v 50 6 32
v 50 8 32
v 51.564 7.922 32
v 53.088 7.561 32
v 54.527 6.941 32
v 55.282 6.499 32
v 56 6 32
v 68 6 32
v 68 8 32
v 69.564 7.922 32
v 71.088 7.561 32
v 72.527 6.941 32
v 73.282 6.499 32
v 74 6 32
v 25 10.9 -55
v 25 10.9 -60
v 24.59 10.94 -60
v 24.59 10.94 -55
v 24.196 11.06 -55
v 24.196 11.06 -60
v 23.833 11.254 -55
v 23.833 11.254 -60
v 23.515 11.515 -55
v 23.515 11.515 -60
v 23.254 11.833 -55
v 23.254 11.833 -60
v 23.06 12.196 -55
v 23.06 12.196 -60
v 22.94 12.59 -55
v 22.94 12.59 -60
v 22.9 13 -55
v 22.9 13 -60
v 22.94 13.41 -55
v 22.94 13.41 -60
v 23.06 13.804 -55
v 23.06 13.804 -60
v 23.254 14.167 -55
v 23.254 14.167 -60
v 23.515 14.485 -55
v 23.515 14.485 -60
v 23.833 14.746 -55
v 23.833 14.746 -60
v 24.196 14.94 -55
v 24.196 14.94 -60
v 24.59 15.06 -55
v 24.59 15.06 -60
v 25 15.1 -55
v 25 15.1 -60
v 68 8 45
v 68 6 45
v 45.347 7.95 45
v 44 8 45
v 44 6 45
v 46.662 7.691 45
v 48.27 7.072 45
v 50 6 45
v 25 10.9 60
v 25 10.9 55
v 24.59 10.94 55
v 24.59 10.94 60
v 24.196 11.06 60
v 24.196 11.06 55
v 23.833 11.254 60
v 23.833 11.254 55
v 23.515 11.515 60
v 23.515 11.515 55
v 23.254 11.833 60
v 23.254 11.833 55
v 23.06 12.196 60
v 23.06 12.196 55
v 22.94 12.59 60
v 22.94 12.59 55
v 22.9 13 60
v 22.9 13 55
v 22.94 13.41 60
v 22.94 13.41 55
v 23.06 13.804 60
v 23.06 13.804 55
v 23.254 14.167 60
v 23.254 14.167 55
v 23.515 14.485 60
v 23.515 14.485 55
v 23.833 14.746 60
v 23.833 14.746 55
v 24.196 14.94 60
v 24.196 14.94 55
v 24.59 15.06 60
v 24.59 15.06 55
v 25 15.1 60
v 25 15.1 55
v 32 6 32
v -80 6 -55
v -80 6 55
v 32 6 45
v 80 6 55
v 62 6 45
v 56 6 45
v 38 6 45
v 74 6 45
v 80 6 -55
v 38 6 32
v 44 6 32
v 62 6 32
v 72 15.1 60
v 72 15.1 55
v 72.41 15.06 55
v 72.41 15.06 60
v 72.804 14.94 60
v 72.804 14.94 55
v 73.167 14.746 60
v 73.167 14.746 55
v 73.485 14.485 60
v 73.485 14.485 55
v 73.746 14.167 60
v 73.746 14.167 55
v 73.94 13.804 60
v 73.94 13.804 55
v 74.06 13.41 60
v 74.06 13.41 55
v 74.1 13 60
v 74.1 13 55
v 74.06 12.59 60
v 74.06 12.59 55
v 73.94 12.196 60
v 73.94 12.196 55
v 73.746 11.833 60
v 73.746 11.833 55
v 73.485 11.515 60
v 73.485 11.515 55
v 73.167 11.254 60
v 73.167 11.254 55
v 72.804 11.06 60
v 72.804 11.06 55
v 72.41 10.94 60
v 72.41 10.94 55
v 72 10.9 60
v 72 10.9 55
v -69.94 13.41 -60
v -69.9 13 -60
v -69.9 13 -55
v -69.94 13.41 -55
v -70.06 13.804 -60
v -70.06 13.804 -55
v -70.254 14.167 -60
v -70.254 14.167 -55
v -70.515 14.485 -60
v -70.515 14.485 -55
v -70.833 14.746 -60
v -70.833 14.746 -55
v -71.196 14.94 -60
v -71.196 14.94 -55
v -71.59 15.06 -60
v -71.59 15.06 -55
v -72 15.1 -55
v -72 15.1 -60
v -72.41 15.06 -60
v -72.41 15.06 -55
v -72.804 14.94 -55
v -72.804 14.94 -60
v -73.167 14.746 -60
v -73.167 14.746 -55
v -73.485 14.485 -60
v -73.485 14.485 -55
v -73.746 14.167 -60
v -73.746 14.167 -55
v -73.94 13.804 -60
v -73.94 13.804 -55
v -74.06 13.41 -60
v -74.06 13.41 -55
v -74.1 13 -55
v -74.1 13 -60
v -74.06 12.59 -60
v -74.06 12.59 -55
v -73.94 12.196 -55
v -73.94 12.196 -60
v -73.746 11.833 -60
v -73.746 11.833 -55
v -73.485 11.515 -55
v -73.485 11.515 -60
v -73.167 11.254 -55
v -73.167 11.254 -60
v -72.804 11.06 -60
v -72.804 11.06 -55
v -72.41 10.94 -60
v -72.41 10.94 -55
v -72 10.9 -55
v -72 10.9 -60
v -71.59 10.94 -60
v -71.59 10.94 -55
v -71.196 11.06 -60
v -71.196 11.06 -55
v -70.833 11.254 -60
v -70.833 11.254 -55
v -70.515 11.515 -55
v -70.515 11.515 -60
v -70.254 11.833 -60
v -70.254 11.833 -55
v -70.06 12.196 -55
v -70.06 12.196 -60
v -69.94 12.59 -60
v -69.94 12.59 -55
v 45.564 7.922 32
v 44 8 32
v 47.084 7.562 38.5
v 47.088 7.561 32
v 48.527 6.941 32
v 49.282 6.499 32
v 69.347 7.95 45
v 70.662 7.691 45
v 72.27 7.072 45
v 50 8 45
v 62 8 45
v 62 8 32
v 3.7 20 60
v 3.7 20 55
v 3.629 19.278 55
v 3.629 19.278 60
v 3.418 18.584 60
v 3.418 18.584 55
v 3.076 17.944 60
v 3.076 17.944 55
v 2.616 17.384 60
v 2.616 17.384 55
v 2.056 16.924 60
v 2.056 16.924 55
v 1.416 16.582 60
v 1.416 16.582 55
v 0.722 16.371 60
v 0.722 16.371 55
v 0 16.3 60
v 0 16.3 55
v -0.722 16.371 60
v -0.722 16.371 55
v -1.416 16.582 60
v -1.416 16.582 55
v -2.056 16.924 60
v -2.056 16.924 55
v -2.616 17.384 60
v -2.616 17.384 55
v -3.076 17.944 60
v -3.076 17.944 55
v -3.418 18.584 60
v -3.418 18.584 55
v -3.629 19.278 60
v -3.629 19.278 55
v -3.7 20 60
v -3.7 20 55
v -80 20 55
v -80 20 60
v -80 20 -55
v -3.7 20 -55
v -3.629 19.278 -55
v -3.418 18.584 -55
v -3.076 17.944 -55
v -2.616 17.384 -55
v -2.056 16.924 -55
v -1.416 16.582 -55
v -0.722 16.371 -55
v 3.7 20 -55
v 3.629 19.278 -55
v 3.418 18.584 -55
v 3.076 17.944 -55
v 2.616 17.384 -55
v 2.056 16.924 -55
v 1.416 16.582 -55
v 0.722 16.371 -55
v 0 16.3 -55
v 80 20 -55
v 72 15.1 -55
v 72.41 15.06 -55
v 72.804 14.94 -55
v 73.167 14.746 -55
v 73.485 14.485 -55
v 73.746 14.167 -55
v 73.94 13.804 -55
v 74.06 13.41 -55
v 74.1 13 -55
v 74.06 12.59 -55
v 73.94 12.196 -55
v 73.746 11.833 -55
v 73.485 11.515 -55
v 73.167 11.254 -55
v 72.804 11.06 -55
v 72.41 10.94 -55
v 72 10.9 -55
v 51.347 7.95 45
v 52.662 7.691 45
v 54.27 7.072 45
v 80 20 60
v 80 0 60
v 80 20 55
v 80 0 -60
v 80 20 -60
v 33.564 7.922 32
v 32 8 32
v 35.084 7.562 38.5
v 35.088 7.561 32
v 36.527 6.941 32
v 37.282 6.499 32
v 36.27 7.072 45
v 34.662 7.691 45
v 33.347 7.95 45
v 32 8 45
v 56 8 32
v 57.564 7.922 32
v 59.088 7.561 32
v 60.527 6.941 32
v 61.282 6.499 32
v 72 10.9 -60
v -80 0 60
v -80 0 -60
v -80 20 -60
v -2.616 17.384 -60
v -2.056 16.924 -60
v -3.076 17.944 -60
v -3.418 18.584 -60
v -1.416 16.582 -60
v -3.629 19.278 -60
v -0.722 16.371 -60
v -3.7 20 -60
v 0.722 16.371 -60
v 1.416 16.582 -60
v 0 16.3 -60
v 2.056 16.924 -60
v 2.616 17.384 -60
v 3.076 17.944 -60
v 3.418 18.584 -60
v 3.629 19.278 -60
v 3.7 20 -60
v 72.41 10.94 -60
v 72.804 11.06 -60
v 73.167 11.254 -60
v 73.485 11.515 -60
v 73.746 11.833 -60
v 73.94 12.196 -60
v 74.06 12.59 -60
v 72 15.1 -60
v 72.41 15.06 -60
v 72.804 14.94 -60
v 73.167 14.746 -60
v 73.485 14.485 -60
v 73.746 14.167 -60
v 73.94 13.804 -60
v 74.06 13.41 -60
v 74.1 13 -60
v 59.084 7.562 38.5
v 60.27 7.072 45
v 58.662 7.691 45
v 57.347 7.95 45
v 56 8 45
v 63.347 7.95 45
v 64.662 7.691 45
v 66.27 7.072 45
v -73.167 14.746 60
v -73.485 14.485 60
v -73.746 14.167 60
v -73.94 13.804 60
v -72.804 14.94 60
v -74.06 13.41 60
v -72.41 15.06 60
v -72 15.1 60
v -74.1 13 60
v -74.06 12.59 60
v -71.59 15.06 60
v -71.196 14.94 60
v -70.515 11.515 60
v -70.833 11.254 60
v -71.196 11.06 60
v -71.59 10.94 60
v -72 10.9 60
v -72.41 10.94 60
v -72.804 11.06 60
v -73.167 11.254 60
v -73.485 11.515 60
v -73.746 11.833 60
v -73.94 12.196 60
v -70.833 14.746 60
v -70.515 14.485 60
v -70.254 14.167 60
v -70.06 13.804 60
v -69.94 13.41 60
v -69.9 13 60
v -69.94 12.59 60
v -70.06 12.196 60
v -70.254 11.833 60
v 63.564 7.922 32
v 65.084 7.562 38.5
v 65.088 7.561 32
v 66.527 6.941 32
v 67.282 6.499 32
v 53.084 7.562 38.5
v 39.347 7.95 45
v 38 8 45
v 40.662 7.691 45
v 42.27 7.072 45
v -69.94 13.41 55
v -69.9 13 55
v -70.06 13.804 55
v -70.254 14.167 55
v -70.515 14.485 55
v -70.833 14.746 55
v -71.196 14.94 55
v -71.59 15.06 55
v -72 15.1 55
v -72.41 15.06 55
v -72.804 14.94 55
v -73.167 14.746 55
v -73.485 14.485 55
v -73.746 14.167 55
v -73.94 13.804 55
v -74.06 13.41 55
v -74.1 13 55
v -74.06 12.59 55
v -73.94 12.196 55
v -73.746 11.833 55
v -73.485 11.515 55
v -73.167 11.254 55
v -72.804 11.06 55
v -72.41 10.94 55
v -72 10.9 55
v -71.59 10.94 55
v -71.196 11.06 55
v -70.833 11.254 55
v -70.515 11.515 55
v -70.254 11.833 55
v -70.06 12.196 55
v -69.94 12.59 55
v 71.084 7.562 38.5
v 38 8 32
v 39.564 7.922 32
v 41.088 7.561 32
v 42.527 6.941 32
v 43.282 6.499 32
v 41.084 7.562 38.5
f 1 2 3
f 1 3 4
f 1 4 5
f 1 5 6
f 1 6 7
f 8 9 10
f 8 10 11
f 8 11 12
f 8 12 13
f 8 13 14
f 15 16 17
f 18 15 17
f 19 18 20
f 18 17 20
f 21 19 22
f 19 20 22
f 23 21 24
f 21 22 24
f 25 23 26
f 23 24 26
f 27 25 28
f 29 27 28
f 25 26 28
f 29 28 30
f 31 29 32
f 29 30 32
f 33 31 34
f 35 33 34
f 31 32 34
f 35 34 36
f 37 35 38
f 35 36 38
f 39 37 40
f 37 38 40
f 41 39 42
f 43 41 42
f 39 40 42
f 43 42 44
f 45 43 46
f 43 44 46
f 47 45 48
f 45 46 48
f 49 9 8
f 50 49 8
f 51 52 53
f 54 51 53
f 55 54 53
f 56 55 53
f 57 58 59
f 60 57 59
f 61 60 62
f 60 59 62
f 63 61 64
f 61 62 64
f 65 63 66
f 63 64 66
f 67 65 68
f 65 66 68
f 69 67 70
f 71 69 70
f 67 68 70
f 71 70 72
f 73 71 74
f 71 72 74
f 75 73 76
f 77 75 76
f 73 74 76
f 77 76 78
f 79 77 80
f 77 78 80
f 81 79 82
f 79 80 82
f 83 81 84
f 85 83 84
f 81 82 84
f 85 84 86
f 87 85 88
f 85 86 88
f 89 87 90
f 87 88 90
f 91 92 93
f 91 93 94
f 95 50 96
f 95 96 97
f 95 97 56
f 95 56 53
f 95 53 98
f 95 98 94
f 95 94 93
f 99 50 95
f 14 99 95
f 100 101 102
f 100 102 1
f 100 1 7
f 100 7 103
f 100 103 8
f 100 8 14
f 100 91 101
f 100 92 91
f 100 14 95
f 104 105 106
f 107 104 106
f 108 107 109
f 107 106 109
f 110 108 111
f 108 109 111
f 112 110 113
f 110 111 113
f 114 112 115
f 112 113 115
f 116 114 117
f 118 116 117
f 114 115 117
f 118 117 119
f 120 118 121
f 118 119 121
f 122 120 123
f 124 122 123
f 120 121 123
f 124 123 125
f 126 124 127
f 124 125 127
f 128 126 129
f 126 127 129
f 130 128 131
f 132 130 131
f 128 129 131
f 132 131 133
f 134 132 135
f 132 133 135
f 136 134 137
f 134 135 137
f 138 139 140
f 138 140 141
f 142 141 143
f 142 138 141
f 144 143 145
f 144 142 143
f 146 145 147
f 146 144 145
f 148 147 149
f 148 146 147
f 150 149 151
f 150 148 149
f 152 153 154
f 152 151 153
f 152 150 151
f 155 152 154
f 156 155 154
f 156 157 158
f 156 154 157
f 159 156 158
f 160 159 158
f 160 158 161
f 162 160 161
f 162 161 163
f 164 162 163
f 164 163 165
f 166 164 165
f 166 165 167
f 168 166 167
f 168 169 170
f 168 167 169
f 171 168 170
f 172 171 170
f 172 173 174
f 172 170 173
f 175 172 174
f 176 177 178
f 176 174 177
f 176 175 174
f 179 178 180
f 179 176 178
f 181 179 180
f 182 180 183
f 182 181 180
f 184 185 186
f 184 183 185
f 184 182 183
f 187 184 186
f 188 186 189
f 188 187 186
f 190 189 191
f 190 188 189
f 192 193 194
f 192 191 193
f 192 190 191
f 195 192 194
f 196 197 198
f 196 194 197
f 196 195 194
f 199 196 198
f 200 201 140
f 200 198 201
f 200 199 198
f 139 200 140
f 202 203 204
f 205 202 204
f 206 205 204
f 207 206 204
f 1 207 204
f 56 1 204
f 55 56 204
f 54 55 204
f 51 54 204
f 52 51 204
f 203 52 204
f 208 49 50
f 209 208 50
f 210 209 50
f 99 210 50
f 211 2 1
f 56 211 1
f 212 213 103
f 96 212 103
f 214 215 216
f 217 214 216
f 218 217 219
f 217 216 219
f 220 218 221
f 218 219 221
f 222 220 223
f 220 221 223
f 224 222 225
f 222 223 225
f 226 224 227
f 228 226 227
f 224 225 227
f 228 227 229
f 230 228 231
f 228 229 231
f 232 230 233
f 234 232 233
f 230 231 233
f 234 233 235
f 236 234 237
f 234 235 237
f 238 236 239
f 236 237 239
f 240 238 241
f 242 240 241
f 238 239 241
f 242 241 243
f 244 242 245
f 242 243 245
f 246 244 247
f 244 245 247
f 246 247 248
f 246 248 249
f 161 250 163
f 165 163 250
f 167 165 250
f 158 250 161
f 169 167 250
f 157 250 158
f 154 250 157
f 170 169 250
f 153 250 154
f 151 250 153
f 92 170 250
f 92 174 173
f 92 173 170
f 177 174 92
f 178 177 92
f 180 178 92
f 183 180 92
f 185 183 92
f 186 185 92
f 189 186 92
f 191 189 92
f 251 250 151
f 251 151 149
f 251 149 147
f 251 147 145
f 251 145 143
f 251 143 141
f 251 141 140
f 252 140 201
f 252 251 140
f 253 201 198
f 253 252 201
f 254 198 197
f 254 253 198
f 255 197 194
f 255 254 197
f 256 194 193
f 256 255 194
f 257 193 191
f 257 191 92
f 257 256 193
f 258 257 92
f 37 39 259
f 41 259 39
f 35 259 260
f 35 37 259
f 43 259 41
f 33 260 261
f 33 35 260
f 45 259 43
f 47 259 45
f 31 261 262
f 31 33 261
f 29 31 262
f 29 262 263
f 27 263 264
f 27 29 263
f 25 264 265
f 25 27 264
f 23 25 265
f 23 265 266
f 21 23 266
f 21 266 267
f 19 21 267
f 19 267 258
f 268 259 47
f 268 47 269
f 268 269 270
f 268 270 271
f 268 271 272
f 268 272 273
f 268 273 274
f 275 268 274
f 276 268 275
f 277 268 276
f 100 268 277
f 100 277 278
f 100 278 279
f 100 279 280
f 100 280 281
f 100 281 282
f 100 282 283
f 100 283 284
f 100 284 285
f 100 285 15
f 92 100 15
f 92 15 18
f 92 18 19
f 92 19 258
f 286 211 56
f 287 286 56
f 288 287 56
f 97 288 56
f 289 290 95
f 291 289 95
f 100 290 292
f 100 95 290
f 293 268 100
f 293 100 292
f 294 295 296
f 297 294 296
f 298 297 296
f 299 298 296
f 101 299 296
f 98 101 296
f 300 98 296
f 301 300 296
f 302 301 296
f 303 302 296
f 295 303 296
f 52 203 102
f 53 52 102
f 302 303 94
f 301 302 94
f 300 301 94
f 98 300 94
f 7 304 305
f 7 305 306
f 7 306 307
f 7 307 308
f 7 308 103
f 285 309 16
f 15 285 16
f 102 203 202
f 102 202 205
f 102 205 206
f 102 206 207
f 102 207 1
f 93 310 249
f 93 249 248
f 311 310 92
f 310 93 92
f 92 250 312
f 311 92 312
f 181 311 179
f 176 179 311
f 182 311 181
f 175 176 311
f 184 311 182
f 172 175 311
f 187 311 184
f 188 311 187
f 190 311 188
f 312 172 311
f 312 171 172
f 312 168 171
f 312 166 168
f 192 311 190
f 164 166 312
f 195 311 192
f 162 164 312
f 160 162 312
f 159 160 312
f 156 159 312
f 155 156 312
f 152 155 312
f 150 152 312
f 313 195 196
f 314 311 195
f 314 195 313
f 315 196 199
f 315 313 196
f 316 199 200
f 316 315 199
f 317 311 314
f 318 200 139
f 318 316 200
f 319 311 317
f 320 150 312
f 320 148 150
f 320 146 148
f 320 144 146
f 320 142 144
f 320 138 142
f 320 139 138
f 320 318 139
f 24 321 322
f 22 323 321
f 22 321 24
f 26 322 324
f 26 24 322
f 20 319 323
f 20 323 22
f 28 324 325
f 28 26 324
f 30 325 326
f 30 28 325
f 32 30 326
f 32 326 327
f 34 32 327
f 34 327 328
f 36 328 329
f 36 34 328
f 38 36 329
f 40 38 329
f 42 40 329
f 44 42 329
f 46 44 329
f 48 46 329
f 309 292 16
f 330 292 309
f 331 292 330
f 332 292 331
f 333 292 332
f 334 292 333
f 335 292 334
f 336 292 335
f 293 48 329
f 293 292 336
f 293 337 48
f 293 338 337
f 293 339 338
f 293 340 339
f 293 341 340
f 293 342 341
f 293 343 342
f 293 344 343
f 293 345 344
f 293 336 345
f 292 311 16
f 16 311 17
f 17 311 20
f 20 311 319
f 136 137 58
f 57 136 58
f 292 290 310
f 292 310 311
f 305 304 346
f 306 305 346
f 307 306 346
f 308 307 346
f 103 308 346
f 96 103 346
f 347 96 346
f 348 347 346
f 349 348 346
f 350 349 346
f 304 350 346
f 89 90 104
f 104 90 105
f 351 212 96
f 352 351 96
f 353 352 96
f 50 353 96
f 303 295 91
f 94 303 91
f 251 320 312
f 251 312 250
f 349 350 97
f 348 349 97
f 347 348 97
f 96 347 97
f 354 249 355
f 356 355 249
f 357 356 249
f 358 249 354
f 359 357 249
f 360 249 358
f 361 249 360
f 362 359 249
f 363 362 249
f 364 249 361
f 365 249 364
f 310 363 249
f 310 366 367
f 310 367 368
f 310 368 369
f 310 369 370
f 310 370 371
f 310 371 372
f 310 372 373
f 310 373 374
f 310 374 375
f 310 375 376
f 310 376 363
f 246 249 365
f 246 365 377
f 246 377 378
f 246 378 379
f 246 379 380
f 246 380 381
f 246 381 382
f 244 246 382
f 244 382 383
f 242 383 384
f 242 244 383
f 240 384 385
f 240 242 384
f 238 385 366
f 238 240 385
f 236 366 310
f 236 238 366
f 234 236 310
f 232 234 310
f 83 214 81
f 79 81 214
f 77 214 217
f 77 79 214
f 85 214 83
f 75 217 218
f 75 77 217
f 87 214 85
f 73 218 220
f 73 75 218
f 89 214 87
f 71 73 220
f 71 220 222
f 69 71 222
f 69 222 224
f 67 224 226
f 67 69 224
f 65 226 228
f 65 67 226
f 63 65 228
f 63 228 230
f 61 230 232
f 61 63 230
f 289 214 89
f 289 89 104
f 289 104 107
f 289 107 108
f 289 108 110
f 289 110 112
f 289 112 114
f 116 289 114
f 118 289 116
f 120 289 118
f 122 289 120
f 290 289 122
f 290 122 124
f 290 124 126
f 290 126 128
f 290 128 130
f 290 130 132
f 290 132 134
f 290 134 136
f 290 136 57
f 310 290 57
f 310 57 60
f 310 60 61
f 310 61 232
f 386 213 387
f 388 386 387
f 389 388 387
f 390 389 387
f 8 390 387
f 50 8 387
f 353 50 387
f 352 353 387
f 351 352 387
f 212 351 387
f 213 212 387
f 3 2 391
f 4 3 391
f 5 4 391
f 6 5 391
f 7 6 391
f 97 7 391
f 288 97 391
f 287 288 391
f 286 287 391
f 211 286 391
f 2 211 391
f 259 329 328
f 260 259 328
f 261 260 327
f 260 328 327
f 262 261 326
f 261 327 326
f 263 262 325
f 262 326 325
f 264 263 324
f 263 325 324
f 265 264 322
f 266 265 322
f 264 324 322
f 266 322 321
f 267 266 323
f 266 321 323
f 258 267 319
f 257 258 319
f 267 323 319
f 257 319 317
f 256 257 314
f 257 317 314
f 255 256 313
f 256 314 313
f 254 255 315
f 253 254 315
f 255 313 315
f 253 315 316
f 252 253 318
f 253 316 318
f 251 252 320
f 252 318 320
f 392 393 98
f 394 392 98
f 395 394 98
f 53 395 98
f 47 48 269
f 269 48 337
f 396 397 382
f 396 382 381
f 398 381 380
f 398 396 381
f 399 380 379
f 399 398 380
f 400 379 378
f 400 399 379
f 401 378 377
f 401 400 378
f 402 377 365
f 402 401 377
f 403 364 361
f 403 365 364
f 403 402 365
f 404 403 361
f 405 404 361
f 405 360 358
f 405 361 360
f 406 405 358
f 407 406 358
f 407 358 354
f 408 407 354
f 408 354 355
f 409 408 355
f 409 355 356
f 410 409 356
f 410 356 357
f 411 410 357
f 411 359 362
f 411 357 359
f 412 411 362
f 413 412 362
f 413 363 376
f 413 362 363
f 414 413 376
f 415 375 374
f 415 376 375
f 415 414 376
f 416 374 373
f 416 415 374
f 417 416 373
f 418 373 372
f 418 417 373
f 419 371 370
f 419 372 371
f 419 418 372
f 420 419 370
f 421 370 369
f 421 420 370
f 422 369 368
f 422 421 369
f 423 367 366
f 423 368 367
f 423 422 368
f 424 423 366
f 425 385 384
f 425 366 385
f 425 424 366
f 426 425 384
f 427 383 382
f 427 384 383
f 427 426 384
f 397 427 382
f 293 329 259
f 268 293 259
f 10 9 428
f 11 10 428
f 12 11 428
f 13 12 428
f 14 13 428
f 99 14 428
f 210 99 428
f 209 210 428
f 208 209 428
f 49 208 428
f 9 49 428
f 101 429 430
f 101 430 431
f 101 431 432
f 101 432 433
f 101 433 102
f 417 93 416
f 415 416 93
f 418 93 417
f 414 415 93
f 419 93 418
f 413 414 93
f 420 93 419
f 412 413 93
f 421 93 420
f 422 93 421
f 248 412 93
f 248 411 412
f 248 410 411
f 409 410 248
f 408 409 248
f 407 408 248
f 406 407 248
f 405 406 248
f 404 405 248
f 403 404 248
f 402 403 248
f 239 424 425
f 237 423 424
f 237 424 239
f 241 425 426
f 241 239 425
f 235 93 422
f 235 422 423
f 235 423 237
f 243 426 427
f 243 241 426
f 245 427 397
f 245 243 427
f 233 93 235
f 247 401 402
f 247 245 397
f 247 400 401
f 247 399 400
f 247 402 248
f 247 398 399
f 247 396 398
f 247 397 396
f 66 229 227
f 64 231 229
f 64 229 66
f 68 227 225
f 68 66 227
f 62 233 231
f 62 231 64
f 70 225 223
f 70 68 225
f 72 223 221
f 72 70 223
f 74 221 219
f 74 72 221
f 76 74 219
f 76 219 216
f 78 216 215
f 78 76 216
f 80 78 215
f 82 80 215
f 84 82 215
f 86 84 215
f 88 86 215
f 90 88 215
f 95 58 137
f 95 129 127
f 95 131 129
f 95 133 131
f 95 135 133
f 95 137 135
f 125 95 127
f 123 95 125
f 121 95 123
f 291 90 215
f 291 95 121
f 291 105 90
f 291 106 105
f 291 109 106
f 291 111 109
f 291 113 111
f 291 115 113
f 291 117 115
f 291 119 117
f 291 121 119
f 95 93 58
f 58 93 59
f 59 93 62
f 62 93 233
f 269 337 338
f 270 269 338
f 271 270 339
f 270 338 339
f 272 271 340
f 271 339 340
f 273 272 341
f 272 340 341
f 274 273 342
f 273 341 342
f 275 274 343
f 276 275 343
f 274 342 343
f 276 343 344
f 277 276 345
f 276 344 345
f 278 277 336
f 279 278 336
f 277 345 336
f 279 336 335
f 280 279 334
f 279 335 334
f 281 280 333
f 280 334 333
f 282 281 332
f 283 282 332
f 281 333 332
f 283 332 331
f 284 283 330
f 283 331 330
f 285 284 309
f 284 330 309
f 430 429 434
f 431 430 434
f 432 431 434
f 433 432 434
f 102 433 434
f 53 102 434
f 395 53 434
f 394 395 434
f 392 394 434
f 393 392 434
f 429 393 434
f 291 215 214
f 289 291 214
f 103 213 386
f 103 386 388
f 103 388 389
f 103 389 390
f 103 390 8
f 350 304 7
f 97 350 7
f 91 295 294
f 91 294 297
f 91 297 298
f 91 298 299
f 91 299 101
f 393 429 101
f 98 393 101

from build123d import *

# Parameters (mm, degrees)
AUFSATZ_LINEAR_AUSTRAGEN3_DEPTH      = 80
SCHNITT_LINEAR_AUSTRAGEN1_DEPTH      = 146.602197786
SCHNITT_LINEAR_AUSTRAGEN1_DEPTH_BACK = 146.602197786
SKIZZE10_R                           = 2.1
SCHNITT_LINEAR_AUSTRAGEN2_DEPTH      = 102.980390272
SCHNITT_LINEAR_AUSTRAGEN2_DEPTH_BACK = 102.980390272
AUFSATZ_LINEAR_AUSTRAGEN4_DEPTH      = 45
LINEARES_MUSTER1_COUNT               = 7
LINEARES_MUSTER1_PITCH               = 6
SKIZZE19_W                           = 160
SKIZZE19_H                           = 14
SCHNITT_LINEAR_AUSTRAGEN3_DEPTH      = 32


with BuildPart() as part:
    # Skizze9 → Aufsatz-Linear austragen3 (new, symmetric)
    with BuildSketch(Plane(origin=(0, 0, 0), x_dir=(0, 0, -1), z_dir=(1, 0, 0))):
        Polygon((-60, 20), (-60, 0), (60, 0), (60, 20), (55, 20), (55, 6), (-55, 6), (-55, 20), align=None)
    extrude(amount=AUFSATZ_LINEAR_AUSTRAGEN3_DEPTH, both=True)

    # Skizze10 → Schnitt-Linear austragen1 (cut, two sides: drawn at the far end of the back side and taken through both)
    with BuildSketch(Plane.XY.offset(60).offset(-SCHNITT_LINEAR_AUSTRAGEN1_DEPTH_BACK)):
        with Locations((-72, 13)):
            Circle(SKIZZE10_R)
        with BuildLine():
            Line((25, 15.1), (72, 15.1))
            ThreePointArc((72, 15.1), (74.1, 13), (72, 10.9))
            Line((72, 10.9), (25, 10.9))
            ThreePointArc((25, 10.9), (22.9, 13), (25, 15.1))
        make_face()
    extrude(amount=SCHNITT_LINEAR_AUSTRAGEN1_DEPTH + SCHNITT_LINEAR_AUSTRAGEN1_DEPTH_BACK, mode=Mode.SUBTRACT)

    # Skizze12 → Schnitt-Linear austragen2 (cut, two sides: drawn at the far end of the back side and taken through both)
    with BuildSketch(Plane.XY.offset(-SCHNITT_LINEAR_AUSTRAGEN2_DEPTH_BACK)):
        with BuildLine():
            Line((-3.7, 20), (3.7, 20))
            ThreePointArc((3.7, 20), (0, 16.3), (-3.7, 20))
        make_face()
    extrude(amount=SCHNITT_LINEAR_AUSTRAGEN2_DEPTH + SCHNITT_LINEAR_AUSTRAGEN2_DEPTH_BACK, mode=Mode.SUBTRACT)

    # Skizze18 → Aufsatz-Linear austragen4 (add)
    with BuildSketch(Plane(origin=(0, 0, 0), x_dir=(-1, 0, 0), z_dir=(0, 0, -1))):
        with BuildLine():
            Line((-32, 6), (-38, 6))
            add(Edge.make_bspline(
                [(-38, 6), (-35.16767955, 8.124664511), (-32, 8)],
                knots=[0, 0, 0, 0.477297659, 0.477297659, 0.477297659], degree=2))
            Line((-32, 8), (-32, 6))
        make_face()
    aufsatz_linear_austragen4 = extrude(amount=-AUFSATZ_LINEAR_AUSTRAGEN4_DEPTH)

    # Lineares Muster1: Aufsatz-Linear austragen4 ×7
    with Locations(*[(i * LINEARES_MUSTER1_PITCH, 0, 0) for i in range(1, LINEARES_MUSTER1_COUNT)]):
        add(aufsatz_linear_austragen4)

    # Skizze19 → Schnitt-Linear austragen3 (cut)
    with BuildSketch(Plane.XY):
        with Locations((0, 13)):
            Rectangle(SKIZZE19_W, SKIZZE19_H)
    extrude(amount=SCHNITT_LINEAR_AUSTRAGEN3_DEPTH, mode=Mode.SUBTRACT)


solid = part.part
